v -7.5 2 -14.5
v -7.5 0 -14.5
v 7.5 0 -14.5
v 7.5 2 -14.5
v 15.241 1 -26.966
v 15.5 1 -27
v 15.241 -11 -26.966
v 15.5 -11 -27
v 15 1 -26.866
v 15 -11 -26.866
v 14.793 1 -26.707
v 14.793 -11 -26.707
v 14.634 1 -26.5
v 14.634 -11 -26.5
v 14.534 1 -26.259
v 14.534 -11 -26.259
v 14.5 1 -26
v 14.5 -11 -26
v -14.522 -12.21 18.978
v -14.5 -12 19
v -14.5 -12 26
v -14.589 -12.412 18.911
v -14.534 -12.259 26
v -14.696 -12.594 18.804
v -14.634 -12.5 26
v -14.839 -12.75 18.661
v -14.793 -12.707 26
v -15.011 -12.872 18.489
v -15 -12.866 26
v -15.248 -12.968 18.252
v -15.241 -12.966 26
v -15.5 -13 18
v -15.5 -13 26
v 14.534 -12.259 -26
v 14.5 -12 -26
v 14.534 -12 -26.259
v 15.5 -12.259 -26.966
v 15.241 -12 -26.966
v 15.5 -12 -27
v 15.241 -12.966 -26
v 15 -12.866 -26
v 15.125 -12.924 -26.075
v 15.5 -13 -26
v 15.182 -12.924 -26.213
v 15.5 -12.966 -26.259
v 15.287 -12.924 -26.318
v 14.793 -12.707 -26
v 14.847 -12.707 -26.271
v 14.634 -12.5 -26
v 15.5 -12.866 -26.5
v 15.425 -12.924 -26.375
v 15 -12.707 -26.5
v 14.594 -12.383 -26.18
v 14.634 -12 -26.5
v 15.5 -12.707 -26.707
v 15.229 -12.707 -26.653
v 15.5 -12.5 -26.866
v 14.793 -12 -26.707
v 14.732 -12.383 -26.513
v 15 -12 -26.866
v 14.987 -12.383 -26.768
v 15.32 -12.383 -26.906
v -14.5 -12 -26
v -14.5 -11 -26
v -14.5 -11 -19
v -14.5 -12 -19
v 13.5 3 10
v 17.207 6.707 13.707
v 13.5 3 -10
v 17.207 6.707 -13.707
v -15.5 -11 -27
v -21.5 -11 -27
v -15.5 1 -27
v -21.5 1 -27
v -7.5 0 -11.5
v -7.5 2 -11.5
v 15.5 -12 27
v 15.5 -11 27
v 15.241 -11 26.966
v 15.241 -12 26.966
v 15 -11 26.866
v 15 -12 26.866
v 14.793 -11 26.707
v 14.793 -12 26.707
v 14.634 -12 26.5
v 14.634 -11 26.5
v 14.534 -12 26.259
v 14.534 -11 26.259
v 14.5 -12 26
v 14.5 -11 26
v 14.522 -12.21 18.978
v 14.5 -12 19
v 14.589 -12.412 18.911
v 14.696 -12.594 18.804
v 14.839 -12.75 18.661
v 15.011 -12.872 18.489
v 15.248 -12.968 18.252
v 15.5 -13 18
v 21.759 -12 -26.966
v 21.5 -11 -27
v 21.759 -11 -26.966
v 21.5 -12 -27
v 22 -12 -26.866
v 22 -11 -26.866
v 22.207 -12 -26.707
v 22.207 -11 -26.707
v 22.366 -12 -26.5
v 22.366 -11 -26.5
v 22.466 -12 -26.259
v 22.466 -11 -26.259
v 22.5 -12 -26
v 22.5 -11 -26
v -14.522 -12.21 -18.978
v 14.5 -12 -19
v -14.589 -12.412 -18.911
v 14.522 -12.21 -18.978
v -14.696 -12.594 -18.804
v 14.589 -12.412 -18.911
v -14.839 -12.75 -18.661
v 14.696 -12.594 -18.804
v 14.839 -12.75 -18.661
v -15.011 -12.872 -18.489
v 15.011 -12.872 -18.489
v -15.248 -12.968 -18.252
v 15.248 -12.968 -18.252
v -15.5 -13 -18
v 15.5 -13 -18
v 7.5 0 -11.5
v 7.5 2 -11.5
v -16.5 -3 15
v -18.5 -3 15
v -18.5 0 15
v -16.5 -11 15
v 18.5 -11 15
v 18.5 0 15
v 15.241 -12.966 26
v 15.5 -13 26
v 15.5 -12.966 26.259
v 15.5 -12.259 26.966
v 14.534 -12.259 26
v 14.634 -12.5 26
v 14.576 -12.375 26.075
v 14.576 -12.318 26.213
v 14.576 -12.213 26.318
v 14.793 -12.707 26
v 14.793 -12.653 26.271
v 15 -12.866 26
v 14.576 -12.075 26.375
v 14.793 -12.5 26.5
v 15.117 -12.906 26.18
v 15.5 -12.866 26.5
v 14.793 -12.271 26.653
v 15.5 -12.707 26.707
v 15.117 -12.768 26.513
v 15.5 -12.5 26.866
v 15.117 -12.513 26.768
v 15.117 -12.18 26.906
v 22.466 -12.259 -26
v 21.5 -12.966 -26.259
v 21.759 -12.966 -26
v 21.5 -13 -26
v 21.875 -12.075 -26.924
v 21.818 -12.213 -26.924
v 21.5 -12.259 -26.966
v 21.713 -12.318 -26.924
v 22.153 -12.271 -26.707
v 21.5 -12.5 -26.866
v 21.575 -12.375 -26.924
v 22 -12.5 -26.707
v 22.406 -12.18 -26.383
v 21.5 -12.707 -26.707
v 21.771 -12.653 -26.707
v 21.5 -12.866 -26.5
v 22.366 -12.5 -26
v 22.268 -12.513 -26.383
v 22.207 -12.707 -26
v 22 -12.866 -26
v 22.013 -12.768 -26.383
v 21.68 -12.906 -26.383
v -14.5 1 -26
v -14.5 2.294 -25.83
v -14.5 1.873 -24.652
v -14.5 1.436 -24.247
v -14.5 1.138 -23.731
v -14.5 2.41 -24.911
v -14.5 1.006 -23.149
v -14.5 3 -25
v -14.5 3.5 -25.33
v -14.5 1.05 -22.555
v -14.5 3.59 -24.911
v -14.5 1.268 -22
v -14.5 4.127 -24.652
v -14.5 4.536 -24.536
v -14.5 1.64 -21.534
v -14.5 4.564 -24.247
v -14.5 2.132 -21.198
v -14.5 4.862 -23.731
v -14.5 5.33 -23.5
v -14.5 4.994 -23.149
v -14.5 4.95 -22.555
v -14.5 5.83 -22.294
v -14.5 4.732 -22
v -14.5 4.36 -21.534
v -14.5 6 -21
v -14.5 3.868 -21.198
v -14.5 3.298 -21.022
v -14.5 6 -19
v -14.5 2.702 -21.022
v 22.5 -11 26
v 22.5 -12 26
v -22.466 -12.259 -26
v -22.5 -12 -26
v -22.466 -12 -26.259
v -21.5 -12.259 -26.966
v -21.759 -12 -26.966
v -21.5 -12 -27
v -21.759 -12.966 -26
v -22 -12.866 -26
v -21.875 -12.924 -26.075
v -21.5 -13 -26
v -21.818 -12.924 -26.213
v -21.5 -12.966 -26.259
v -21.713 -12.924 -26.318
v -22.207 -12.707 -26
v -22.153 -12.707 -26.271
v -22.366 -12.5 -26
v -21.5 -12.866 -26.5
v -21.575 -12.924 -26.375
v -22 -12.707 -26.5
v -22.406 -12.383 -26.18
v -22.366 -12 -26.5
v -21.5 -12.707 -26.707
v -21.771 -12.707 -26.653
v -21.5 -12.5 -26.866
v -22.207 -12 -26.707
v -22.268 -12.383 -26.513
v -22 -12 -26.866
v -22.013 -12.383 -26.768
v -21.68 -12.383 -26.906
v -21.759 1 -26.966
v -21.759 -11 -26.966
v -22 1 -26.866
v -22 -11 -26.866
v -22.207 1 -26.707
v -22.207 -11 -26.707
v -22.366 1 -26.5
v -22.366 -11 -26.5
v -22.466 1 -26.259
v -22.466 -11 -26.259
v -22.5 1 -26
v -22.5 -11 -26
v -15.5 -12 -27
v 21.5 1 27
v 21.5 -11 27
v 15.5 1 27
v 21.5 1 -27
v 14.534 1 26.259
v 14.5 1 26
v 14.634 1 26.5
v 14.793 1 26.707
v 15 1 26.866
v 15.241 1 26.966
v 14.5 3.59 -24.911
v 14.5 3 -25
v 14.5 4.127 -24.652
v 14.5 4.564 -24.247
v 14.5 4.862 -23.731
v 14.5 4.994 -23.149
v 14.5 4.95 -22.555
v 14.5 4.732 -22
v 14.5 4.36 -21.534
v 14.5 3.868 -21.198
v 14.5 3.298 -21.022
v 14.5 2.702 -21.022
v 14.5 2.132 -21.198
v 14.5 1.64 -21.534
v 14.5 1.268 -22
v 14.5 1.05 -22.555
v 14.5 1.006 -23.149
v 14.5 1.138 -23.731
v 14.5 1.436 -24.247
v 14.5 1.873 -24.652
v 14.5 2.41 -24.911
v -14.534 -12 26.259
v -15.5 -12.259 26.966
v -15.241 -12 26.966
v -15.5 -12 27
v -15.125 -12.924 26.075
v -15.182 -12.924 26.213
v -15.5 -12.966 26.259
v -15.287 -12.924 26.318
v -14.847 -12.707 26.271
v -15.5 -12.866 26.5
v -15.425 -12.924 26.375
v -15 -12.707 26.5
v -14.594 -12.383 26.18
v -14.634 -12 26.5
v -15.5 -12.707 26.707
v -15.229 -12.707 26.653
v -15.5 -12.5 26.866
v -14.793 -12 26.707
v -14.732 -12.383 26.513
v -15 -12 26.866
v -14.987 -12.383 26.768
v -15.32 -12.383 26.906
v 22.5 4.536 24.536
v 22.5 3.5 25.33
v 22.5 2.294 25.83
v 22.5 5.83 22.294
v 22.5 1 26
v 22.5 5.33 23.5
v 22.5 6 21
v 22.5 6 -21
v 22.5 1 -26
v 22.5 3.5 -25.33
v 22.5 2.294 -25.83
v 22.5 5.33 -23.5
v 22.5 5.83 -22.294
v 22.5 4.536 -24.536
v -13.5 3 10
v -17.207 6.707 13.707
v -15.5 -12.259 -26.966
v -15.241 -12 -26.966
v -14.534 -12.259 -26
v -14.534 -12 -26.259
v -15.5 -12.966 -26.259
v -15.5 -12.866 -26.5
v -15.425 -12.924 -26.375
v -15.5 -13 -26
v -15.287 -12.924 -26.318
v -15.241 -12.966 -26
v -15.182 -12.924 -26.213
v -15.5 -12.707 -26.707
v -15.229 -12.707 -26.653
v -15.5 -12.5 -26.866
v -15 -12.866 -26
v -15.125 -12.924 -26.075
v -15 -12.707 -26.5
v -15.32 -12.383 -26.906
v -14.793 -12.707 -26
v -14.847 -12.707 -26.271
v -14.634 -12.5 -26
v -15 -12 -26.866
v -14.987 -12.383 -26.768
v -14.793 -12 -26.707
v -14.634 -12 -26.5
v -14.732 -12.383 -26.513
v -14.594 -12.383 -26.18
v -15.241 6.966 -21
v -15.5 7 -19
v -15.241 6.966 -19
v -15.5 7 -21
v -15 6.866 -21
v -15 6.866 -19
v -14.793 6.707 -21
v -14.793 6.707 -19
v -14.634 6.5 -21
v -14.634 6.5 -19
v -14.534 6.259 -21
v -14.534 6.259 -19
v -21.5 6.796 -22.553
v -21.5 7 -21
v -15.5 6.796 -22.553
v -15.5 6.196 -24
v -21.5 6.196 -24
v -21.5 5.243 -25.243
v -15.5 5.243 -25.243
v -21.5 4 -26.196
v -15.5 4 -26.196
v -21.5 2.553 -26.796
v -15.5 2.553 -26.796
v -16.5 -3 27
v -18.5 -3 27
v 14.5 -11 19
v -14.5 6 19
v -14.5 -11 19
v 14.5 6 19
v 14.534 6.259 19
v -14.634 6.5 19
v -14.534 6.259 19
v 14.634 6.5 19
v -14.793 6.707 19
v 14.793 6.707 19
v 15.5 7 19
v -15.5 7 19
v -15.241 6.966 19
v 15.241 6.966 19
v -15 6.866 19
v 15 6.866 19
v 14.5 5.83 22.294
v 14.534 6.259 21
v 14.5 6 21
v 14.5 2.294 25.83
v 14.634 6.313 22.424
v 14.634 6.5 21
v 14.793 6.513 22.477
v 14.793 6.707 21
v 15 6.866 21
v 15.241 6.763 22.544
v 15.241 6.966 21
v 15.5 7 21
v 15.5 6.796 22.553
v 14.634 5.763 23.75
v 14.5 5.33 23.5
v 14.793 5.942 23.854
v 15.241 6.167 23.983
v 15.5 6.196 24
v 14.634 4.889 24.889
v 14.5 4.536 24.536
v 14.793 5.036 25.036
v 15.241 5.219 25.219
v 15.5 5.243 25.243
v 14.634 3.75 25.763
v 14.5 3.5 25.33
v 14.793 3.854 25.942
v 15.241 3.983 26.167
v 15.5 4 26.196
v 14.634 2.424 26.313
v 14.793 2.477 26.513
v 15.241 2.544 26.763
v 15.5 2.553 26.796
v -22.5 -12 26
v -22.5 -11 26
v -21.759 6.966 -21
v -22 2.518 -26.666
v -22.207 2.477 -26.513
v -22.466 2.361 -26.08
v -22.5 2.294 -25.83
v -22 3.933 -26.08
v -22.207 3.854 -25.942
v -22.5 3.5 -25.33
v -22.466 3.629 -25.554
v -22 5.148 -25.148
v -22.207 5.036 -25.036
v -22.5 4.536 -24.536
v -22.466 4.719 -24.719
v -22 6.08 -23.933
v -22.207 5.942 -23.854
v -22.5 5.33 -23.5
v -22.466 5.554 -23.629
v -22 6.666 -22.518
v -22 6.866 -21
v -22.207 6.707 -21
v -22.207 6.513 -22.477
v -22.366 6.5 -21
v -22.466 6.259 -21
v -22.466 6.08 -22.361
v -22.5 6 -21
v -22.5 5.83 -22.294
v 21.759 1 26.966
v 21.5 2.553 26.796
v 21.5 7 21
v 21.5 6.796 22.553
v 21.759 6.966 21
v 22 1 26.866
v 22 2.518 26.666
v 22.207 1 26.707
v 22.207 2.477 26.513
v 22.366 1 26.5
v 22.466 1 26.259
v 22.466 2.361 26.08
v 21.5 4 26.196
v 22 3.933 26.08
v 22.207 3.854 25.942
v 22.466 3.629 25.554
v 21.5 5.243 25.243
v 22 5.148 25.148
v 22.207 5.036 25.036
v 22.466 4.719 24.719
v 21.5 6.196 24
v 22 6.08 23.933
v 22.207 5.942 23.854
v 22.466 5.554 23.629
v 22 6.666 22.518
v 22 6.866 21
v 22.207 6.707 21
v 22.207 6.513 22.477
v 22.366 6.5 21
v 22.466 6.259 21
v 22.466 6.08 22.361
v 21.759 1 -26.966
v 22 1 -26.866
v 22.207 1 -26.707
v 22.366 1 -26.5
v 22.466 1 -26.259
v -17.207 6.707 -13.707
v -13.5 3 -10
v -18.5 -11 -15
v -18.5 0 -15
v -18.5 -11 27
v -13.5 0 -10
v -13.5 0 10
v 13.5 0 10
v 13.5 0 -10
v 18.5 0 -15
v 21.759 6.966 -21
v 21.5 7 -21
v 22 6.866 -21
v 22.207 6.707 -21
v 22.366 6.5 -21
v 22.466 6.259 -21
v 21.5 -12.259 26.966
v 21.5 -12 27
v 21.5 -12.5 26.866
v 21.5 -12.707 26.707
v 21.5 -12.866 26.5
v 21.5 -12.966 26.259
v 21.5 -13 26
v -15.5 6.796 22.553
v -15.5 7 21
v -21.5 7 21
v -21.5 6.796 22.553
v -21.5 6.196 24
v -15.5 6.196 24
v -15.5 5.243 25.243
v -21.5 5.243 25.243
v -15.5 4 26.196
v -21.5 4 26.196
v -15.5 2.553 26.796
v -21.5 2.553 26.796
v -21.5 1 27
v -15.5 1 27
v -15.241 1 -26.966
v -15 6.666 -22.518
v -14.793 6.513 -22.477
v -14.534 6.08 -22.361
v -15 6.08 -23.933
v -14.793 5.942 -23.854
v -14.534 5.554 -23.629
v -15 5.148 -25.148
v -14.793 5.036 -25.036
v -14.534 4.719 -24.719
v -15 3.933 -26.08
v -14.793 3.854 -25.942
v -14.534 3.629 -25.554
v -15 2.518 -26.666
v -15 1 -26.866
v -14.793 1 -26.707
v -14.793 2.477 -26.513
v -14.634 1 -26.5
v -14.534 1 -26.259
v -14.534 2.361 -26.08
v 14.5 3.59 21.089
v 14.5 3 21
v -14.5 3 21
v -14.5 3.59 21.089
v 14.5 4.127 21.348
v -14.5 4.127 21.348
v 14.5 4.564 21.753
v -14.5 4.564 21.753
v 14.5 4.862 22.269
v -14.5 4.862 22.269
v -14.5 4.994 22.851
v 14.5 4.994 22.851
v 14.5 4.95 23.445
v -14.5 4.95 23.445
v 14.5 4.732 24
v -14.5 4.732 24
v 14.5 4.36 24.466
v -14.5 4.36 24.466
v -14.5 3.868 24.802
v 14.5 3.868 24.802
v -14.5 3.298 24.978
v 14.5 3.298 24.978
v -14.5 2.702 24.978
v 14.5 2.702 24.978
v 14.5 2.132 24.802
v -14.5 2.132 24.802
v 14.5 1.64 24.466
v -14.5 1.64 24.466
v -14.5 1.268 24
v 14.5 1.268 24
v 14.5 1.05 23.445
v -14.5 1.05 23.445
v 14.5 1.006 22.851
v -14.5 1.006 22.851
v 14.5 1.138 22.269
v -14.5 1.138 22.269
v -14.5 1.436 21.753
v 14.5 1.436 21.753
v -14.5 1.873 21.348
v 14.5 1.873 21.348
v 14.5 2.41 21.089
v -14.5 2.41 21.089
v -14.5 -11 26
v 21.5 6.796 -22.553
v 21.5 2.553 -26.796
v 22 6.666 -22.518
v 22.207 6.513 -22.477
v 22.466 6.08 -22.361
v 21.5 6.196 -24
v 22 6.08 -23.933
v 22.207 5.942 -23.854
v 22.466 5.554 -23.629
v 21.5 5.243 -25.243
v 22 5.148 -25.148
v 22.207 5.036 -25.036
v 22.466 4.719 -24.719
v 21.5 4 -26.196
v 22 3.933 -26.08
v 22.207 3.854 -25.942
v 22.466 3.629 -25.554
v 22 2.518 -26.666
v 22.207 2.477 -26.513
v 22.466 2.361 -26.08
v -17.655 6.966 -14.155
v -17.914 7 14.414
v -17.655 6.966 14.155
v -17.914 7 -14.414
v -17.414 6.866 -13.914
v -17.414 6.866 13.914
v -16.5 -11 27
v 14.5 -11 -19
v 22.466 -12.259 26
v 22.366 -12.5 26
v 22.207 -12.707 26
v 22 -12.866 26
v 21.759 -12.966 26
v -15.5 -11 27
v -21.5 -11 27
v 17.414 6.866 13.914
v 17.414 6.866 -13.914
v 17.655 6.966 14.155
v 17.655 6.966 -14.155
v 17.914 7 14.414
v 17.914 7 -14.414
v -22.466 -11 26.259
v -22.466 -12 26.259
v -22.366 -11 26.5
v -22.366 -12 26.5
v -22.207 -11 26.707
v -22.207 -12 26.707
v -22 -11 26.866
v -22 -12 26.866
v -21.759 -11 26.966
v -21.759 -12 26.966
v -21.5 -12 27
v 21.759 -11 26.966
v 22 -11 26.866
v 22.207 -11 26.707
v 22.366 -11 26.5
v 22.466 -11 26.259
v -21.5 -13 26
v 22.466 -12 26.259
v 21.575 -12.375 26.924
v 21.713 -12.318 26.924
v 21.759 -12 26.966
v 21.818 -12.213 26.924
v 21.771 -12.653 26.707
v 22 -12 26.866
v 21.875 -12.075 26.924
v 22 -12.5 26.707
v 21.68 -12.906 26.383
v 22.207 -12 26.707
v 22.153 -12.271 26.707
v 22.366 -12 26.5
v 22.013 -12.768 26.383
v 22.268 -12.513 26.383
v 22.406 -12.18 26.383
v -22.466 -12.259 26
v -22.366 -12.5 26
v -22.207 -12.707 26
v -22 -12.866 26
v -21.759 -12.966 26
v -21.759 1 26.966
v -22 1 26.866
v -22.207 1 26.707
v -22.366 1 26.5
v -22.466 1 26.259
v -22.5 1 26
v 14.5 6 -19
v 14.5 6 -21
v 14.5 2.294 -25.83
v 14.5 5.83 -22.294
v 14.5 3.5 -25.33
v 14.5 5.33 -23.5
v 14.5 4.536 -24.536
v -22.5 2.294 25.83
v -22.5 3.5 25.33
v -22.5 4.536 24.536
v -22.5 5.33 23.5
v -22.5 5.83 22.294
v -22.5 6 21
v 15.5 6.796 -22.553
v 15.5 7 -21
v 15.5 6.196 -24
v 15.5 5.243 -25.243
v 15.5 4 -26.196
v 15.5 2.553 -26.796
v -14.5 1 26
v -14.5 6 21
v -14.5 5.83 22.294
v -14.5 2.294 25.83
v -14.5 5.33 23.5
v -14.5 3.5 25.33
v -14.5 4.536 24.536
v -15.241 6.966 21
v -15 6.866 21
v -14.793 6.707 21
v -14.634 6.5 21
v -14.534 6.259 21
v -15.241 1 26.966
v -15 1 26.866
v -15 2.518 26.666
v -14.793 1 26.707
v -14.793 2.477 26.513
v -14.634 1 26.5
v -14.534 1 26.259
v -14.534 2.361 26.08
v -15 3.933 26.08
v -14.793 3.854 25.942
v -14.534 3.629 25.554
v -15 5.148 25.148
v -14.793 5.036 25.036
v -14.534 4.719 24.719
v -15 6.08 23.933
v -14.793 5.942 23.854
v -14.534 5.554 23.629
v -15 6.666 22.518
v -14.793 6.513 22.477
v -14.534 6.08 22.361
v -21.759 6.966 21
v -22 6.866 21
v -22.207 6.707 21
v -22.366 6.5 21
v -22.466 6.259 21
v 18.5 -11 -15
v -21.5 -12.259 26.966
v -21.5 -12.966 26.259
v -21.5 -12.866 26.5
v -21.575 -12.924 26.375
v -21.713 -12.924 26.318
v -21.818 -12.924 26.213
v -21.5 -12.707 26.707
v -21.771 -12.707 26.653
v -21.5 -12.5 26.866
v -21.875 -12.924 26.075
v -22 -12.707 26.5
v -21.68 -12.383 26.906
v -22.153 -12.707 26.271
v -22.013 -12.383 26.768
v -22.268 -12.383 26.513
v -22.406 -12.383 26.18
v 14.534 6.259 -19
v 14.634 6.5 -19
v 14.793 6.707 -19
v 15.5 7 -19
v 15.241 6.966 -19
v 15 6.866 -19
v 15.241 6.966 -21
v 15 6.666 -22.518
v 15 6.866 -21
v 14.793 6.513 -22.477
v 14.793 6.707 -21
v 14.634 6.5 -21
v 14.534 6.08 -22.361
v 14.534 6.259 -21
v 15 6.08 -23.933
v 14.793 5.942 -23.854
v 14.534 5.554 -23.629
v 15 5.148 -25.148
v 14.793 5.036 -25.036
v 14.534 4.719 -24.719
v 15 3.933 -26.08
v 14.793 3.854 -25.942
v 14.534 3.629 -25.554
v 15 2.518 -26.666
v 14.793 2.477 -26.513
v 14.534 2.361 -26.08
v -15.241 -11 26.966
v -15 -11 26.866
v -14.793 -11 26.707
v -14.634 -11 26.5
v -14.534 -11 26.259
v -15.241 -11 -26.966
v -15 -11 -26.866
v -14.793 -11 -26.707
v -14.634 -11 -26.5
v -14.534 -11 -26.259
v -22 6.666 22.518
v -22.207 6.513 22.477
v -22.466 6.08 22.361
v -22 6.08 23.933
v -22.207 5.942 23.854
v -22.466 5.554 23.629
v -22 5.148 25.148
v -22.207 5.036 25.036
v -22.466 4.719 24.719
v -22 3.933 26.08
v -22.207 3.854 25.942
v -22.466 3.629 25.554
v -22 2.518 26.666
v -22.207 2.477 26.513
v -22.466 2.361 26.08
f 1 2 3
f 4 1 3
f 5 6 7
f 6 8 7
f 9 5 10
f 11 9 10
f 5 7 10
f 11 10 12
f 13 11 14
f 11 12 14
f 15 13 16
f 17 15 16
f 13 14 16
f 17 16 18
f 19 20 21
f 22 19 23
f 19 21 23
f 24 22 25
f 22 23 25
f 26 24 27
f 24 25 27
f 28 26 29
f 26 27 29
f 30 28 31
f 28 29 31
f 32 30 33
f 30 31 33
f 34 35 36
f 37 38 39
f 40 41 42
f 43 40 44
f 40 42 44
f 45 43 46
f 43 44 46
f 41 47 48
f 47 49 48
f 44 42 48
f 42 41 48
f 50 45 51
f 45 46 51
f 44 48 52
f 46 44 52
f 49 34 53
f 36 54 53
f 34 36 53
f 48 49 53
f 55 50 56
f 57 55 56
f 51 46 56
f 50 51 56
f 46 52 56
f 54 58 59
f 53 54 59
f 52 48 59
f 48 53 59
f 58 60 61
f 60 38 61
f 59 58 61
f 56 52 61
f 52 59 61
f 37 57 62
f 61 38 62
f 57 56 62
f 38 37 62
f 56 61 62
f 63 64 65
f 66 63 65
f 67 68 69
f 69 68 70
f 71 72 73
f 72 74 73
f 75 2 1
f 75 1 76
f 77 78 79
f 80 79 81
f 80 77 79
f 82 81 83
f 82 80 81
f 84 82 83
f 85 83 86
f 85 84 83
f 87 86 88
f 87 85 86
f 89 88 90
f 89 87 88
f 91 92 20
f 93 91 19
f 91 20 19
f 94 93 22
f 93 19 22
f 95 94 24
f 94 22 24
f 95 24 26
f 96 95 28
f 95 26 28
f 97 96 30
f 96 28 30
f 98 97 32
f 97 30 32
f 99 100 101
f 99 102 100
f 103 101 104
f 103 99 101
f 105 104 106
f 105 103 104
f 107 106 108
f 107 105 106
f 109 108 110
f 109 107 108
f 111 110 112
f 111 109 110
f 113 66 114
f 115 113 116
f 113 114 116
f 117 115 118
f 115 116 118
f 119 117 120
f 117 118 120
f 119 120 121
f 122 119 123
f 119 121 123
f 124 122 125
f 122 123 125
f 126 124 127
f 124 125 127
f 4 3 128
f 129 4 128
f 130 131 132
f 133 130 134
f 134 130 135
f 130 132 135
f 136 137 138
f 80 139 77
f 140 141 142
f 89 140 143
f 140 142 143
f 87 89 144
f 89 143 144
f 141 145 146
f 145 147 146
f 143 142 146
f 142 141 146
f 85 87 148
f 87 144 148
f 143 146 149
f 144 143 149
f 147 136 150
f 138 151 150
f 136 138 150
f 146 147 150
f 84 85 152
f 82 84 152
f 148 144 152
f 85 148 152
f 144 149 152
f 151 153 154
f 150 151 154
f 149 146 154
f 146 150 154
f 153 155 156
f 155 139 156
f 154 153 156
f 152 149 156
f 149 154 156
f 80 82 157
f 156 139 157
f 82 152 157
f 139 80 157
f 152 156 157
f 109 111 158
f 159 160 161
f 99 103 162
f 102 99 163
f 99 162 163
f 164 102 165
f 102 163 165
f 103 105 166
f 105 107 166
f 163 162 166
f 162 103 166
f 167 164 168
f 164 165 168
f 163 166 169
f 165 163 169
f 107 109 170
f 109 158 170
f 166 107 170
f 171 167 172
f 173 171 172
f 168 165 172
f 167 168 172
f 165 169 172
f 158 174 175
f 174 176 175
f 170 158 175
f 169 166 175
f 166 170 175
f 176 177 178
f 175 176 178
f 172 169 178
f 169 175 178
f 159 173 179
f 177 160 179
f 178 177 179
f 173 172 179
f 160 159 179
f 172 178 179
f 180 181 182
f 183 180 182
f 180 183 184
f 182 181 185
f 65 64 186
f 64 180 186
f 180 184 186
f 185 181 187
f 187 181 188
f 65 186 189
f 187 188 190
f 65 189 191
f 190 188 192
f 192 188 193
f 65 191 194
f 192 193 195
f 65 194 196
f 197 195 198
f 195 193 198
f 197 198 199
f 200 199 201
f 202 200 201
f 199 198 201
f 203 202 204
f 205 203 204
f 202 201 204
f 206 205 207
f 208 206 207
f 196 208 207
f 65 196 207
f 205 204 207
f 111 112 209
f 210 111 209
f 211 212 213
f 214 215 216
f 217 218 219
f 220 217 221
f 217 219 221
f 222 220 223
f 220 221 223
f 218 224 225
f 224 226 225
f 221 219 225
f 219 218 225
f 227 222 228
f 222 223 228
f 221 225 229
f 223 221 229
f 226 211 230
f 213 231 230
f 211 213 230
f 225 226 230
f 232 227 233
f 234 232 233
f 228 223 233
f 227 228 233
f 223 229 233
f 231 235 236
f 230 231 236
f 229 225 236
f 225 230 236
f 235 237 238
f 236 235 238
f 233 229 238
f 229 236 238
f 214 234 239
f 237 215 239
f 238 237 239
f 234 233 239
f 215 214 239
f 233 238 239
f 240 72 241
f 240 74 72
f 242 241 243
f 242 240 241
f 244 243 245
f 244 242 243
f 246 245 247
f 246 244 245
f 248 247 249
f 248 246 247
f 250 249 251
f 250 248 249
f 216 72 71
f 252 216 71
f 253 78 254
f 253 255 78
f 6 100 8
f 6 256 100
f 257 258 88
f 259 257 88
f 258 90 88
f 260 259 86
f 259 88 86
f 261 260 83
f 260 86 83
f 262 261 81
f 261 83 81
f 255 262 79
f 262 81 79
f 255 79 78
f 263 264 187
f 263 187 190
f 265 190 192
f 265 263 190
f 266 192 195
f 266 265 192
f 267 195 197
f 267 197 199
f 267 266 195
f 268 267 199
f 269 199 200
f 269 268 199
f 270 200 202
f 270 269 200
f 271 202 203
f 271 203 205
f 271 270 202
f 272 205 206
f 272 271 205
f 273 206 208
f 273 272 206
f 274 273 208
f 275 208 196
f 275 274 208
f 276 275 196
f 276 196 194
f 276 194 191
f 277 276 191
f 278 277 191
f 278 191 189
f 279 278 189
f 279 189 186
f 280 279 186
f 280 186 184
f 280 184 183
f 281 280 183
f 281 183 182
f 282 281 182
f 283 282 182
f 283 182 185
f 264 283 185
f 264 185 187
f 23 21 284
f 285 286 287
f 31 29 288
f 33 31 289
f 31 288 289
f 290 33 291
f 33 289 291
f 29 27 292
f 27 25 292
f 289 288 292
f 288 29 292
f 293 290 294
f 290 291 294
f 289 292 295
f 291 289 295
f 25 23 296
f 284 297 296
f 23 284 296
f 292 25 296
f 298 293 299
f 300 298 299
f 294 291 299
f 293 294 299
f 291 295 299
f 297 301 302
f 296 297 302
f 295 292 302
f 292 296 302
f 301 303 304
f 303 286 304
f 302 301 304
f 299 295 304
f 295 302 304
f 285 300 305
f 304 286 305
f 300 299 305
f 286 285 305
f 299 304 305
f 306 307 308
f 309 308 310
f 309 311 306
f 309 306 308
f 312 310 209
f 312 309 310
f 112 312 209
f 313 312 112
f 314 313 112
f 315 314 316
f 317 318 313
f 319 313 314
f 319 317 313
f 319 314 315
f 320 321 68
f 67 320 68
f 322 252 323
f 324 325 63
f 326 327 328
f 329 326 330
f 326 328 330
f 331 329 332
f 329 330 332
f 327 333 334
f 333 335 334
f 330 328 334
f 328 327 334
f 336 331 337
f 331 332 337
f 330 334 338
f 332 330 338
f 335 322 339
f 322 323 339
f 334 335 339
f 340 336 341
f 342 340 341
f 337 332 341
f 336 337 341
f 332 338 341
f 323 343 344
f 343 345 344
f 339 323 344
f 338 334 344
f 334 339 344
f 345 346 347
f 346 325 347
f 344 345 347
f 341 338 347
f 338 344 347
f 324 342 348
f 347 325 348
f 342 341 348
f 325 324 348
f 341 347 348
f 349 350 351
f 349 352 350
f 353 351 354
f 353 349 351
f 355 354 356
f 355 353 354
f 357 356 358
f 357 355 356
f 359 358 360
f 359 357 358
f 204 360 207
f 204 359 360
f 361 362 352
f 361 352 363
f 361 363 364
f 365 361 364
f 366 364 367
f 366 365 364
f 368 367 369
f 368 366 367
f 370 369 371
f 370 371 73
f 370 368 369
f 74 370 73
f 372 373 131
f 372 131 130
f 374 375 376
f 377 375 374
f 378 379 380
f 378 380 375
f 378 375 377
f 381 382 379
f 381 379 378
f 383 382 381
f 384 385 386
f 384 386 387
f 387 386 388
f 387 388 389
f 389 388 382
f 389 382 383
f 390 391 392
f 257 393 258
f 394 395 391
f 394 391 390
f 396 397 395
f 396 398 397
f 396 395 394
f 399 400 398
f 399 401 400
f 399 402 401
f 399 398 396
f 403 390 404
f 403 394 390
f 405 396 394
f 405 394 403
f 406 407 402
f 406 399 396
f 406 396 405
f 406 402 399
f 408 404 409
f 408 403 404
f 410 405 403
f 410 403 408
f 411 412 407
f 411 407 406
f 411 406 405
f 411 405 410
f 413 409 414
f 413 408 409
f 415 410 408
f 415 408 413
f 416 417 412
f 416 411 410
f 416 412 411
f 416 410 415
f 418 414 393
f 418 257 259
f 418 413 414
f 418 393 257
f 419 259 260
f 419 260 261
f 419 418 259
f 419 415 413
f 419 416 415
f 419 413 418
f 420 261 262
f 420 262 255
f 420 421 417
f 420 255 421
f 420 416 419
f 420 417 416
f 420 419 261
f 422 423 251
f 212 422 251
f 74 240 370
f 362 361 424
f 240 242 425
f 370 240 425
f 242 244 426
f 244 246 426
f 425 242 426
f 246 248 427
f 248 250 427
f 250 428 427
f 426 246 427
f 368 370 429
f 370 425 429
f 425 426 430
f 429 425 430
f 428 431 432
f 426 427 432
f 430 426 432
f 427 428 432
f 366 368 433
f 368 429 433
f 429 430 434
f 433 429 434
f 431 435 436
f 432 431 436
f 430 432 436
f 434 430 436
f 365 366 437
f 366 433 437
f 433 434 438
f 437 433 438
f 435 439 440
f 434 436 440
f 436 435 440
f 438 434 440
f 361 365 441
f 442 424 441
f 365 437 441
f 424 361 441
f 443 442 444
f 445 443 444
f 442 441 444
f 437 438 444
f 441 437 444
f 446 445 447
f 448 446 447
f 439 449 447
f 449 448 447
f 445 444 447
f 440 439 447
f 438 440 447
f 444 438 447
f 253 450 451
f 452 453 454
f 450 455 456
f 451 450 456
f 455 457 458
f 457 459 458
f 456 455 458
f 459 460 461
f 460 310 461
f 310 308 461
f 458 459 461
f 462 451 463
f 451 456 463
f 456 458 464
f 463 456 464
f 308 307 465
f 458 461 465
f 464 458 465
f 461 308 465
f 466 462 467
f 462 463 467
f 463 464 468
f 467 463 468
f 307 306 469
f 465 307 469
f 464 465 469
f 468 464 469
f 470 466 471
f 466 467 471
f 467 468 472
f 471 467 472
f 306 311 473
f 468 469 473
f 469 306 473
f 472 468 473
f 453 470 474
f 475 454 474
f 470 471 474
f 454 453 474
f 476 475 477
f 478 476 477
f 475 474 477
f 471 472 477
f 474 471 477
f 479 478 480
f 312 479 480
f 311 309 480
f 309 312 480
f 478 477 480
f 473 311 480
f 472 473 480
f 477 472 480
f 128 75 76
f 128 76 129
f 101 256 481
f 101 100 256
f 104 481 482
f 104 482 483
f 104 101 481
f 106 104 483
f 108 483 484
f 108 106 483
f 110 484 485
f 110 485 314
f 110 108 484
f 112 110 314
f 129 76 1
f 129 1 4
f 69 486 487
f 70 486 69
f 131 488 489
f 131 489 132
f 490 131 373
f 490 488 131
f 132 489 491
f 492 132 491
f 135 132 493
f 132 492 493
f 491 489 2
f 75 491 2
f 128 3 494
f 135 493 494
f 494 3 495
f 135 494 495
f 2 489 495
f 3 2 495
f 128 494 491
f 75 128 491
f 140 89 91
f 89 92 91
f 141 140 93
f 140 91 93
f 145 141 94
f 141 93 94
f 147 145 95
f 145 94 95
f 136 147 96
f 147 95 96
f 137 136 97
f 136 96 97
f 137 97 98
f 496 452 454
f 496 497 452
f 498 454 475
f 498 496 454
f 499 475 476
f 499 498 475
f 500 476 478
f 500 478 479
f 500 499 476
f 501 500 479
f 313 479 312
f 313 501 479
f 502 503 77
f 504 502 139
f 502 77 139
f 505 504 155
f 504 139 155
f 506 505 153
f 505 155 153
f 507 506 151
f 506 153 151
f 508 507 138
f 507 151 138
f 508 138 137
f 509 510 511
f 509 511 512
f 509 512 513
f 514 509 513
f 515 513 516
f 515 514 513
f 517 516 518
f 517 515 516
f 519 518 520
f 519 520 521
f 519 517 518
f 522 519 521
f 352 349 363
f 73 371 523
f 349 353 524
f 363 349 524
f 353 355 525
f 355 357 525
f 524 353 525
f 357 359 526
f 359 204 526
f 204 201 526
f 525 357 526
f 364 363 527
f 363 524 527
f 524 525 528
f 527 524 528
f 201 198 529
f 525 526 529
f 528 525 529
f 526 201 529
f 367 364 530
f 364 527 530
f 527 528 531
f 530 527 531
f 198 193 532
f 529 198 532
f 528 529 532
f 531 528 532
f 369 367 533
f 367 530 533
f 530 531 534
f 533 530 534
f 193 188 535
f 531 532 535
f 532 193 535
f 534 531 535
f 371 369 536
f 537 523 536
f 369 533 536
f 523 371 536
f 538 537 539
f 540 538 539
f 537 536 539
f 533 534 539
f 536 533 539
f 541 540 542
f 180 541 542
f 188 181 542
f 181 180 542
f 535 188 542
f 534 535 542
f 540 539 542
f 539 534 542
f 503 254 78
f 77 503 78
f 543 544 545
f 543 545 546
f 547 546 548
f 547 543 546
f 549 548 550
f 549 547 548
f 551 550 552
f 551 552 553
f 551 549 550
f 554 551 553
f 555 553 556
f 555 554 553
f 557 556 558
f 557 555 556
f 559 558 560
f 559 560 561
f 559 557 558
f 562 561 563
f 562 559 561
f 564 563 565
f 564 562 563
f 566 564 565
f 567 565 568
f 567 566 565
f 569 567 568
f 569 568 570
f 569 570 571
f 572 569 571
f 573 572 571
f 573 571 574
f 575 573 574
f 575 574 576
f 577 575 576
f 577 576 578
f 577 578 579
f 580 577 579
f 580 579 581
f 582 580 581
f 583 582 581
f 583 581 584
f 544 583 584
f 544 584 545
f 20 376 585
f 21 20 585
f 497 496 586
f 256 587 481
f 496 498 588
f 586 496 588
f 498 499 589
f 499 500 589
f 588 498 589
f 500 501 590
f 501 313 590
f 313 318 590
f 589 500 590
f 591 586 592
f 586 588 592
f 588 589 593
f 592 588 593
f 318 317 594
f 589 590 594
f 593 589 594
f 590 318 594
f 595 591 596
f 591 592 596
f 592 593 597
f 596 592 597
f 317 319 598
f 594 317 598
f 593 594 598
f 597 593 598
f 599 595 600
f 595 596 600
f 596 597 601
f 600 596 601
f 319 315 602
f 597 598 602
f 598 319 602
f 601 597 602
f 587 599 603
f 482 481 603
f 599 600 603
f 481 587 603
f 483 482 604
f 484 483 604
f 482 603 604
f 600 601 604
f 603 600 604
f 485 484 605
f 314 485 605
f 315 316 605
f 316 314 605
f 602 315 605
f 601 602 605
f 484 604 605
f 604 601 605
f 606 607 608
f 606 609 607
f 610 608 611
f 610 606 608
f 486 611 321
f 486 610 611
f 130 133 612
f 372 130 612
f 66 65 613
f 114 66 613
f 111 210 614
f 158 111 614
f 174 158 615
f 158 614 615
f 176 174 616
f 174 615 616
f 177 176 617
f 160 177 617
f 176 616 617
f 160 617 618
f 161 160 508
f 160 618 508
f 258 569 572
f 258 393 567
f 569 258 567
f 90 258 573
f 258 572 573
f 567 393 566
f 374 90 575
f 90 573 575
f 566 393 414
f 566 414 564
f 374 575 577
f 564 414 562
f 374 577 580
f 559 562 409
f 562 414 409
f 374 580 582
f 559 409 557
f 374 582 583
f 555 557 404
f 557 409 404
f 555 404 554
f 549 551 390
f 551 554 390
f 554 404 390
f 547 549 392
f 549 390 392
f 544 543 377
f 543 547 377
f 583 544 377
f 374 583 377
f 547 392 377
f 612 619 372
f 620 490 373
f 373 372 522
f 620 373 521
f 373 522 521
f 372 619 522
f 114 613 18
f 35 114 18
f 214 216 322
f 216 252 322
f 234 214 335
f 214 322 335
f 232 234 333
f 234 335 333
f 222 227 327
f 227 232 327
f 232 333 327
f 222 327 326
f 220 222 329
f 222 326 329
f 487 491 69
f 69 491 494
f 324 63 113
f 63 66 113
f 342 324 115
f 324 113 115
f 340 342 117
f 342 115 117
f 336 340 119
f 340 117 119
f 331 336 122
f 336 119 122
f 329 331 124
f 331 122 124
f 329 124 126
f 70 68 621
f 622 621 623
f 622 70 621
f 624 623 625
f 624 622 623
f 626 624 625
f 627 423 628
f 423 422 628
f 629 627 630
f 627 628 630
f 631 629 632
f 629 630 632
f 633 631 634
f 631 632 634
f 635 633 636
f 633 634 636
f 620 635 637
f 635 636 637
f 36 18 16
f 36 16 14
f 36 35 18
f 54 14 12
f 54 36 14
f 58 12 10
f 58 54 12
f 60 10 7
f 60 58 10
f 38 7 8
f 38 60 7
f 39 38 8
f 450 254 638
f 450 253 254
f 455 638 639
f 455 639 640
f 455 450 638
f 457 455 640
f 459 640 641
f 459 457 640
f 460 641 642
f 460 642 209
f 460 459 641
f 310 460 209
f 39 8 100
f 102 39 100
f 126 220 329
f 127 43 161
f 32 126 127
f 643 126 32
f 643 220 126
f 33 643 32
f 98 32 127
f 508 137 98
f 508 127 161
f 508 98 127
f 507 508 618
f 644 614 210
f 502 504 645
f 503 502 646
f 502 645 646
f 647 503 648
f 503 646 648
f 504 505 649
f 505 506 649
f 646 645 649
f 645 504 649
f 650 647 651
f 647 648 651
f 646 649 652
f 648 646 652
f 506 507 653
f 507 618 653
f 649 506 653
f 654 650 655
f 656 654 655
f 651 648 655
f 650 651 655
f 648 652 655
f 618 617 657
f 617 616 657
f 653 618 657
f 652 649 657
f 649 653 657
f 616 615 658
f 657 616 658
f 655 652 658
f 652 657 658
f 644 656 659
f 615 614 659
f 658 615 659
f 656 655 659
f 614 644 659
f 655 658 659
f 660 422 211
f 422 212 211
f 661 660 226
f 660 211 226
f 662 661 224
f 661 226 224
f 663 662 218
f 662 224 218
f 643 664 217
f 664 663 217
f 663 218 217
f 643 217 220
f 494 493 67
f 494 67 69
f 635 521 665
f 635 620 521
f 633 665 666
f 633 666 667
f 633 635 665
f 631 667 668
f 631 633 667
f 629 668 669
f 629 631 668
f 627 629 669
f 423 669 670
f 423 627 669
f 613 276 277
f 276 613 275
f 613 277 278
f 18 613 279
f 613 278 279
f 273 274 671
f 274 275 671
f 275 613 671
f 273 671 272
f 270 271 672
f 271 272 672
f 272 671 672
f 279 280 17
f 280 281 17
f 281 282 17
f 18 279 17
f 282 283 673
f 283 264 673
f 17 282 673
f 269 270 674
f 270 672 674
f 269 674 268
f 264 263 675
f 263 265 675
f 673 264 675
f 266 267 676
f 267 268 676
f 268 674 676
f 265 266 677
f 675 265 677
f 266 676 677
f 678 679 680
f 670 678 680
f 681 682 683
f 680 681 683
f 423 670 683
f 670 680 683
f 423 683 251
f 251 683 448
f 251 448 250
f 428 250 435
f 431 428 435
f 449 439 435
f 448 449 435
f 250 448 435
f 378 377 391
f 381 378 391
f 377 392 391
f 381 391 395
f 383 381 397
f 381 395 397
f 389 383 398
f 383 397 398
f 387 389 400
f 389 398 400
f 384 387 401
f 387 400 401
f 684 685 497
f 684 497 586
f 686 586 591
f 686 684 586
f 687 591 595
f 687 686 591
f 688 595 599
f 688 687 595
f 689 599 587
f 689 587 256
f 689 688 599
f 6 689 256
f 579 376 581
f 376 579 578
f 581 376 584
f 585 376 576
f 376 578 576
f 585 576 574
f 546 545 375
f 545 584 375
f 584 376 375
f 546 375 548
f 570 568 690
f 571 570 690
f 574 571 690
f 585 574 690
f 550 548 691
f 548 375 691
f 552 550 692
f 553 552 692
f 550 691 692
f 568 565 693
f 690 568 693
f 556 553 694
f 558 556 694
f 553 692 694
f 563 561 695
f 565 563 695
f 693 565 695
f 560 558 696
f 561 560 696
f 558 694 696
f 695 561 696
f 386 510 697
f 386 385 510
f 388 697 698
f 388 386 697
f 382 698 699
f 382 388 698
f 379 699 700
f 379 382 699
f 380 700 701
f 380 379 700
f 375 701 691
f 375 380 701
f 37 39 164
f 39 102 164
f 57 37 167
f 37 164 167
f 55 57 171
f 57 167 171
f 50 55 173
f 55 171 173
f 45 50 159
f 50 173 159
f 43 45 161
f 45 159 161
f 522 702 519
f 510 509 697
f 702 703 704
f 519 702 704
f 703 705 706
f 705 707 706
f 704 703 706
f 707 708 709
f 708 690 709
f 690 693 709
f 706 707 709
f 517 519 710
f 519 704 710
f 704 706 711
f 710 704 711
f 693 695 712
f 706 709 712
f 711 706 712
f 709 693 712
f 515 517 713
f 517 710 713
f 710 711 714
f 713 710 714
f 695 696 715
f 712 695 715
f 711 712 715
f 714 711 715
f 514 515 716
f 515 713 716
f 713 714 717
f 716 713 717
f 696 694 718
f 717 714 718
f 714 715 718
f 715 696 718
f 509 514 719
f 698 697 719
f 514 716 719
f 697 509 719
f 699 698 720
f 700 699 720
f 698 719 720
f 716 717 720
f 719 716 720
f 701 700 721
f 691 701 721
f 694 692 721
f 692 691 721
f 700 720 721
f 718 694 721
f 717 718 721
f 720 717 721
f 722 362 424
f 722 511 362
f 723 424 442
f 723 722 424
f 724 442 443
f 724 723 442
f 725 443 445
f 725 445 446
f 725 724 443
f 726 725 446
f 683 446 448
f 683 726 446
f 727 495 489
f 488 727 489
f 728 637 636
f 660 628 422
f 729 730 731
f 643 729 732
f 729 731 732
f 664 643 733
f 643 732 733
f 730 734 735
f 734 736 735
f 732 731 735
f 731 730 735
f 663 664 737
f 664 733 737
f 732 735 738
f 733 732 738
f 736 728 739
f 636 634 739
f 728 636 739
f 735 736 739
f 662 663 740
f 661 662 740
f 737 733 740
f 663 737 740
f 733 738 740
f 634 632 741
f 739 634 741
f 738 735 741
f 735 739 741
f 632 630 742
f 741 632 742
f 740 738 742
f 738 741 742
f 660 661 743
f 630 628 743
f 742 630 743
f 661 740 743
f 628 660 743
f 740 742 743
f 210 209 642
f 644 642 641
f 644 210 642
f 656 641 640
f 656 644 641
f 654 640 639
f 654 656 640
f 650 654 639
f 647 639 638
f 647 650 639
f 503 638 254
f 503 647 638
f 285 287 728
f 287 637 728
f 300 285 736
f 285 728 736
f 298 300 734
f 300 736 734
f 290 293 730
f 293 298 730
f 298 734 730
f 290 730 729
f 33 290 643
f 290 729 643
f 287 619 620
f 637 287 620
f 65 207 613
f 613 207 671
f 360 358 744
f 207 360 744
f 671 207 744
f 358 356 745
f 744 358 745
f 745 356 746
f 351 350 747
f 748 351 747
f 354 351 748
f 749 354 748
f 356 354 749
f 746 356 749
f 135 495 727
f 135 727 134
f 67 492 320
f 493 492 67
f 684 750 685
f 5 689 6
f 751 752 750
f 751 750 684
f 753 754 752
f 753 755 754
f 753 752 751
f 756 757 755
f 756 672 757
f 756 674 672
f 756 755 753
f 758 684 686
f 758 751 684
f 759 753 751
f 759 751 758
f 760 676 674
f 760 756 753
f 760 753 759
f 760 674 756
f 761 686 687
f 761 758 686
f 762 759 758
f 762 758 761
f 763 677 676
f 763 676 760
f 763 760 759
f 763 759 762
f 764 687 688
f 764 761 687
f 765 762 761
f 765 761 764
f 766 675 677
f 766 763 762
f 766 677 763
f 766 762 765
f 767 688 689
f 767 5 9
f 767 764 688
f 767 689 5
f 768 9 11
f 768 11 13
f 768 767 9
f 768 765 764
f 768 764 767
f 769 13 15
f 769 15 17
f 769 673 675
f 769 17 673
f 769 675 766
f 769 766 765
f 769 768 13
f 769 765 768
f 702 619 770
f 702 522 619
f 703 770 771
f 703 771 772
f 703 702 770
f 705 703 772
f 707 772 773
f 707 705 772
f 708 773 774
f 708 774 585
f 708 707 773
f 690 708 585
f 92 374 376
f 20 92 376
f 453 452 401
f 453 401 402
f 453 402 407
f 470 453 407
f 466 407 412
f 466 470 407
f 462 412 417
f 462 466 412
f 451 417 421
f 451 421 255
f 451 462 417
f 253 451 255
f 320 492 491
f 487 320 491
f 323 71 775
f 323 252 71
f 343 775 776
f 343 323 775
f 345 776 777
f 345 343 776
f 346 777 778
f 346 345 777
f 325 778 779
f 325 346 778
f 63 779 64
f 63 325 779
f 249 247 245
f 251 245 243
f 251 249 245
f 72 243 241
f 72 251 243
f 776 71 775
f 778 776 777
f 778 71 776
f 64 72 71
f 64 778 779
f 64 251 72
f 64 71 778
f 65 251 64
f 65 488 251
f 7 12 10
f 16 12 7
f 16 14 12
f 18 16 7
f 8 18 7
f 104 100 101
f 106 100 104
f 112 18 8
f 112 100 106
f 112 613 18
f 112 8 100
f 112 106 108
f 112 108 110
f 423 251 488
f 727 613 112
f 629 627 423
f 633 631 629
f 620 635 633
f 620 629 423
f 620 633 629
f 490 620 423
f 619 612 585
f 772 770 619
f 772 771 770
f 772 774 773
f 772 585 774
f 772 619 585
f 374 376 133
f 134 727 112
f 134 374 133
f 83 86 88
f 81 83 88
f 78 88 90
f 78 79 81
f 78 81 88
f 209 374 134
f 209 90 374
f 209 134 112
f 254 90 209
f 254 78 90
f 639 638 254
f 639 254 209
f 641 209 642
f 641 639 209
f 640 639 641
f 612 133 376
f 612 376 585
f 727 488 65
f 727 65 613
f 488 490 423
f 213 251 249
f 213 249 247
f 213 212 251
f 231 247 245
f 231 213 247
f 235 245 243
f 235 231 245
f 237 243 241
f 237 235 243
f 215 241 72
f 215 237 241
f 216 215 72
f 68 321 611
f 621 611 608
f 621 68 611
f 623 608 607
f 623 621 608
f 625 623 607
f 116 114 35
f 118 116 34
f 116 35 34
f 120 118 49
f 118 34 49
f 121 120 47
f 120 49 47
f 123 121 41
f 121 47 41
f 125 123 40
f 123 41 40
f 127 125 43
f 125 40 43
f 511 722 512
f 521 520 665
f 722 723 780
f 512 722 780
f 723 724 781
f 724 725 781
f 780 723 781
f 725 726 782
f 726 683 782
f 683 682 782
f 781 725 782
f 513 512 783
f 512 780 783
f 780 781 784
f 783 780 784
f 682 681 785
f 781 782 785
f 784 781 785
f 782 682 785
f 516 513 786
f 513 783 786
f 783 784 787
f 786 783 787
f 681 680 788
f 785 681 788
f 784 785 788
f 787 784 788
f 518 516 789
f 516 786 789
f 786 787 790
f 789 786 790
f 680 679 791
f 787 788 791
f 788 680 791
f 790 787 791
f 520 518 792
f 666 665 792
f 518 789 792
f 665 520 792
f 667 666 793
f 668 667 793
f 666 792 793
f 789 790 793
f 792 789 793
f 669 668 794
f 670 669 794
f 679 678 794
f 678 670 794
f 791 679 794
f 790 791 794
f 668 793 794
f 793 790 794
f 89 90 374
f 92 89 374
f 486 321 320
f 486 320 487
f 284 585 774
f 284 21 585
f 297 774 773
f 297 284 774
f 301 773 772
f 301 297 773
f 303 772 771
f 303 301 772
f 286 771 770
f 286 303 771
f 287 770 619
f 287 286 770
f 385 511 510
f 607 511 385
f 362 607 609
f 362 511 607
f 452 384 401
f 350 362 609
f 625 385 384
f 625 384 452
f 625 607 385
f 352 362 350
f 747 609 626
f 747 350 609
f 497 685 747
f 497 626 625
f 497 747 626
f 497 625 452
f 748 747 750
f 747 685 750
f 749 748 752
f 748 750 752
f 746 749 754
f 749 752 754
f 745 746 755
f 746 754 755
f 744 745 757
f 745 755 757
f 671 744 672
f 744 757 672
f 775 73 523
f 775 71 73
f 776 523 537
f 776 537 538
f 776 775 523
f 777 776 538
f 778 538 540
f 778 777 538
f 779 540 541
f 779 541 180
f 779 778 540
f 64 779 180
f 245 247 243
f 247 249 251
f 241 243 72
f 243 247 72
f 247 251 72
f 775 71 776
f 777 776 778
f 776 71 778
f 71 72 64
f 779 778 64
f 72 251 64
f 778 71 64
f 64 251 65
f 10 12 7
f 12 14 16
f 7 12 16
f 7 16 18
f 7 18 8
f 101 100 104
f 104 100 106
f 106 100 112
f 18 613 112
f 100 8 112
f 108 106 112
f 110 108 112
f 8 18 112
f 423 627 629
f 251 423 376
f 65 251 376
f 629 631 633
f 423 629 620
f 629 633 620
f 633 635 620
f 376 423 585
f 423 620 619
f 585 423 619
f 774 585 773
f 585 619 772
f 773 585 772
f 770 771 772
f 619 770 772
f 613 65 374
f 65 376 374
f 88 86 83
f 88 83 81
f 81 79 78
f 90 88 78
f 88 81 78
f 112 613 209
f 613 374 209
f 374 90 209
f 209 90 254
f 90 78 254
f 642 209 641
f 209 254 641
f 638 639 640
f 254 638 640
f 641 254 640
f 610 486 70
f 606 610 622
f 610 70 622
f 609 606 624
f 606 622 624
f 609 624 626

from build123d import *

# Parameters (mm, degrees)
SKETCH1_W           = 27
SKETCH1_H           = 20
OLED_FACE_DEPTH     = 7
OLED_INDENT_SIZE    = 4
SKETCH4_W           = 15
SKETCH4_H           = 3
CUT_EXTRUDE1_DEPTH  = 2
FILLET3_R           = 6
BOSS_EXTRUDE4_REACH = 47
SKETCH5_R           = 2
SKETCH6_W           = 29
SKETCH6_H           = 4
BOSS_EXTRUDE7_DEPTH = 11
OLED_BOTTOM_DEPTH   = 2
SKETCH9_W           = 2
SKETCH9_H           = 12
CUT_EXTRUDE2_DEPTH  = 8
FILLET4_R           = 1
FILLET5_R           = 1
FILLET6_R           = 1


with BuildPart() as part:
    # Sketch1 → OLED_Face (new body)
    with BuildSketch(Plane(origin=(0, 0, 0), x_dir=(1, 0, 0), z_dir=(0, 1, 0))):
        Polygon((14.5, 19), (-14.5, 19), (-14.5, 27), (-22.5, 27), (-22.5, -27), (-14.5, -27), (-14.5, -19), (14.5, -19), (14.5, -27), (22.5, -27), (22.5, 27), (14.5, 27), align=None)
        Rectangle(SKETCH1_W, SKETCH1_H, mode=Mode.SUBTRACT)
    extrude(amount=OLED_FACE_DEPTH)

    # OLED_Indent
    oled_indent_edges = [part.edges().sort_by_distance(p)[0] for p in [
        (0, 7, -10),
        (13.5, 7, 0),
        (0, 7, 10),
        (-13.5, 7, 0),
    ]]
    chamfer(oled_indent_edges, length=OLED_INDENT_SIZE)

    # Sketch4 → Cut-Extrude1 (cut)
    with BuildSketch(Plane.XZ):
        with Locations((0, -13)):
            Rectangle(SKETCH4_W, SKETCH4_H)
    extrude(amount=-CUT_EXTRUDE1_DEPTH, mode=Mode.SUBTRACT)

    # Fillet3
    fillet3_edges = [part.edges().sort_by_distance(p)[0] for p in [
        (-18.5, 7, -27),
        (18.5, 7, -27),
        (-18.5, 7, 27),
        (18.5, 7, 27),
    ]]
    fillet(fillet3_edges, radius=FILLET3_R)

    # Sketch5 → Boss-Extrude4 (add, up to next)
    with BuildSketch(Plane(origin=(22.5, 0, 0), x_dir=(0, 0, -1), z_dir=(1, 0, 0)), mode=Mode.PRIVATE) as boss_extrude4_sk1:
        with Locations((-23, 3)):
            Circle(SKETCH5_R)
    boss_extrude4_tool1 = extrude(boss_extrude4_sk1.sketch, amount=-BOSS_EXTRUDE4_REACH, mode=Mode.PRIVATE) - part.part
    add(boss_extrude4_tool1.solids().sort_by_distance((22.5, 3, 23))[0])
    # Sketch5 → Boss-Extrude4 (add, up to next)
    with BuildSketch(Plane(origin=(22.5, 0, 0), x_dir=(0, 0, -1), z_dir=(1, 0, 0)), mode=Mode.PRIVATE) as boss_extrude4_sk2:
        with Locations((23, 3)):
            Circle(SKETCH5_R)
    boss_extrude4_tool2 = extrude(boss_extrude4_sk2.sketch, amount=-BOSS_EXTRUDE4_REACH, mode=Mode.PRIVATE) - part.part
    add(boss_extrude4_tool2.solids().sort_by_distance((22.5, 3, -23))[0])

    # Sketch6 → Boss-Extrude7 (add)
    with BuildSketch(Plane.XZ):
        Polygon((-14.5, 19), (-14.5, 27), (-22.5, 27), (-22.5, -27), (-14.5, -27), (-14.5, -19), (-14.5, -15), (-18.5, -15), (-18.5, 15), (-14.5, 15), align=None)
        Polygon((14.5, -15), (18.5, -15), (18.5, 15), (14.5, 15), (14.5, 19), (14.5, 27), (22.5, 27), (22.5, -27), (14.5, -27), (14.5, -19), align=None)
        with Locations((0, 17)):
            Rectangle(SKETCH6_W, SKETCH6_H)
        with Locations((0, -17)):
            Rectangle(SKETCH6_W, SKETCH6_H)
    extrude(amount=BOSS_EXTRUDE7_DEPTH)

    # Sketch9 → Cut-Extrude2 (cut)
    with BuildSketch(Plane.XZ.offset(11)):
        with Locations((-17.5, 21)):
            Rectangle(SKETCH9_W, SKETCH9_H)
    extrude(amount=-CUT_EXTRUDE2_DEPTH, mode=Mode.SUBTRACT)

    # Fillet5
    fillet5_edges = [part.edges().sort_by_distance(p)[0] for p in [
        (22.5, 7, 0),
        (-22.5, 7, 0),
        (14.5, -5, -27),
        (14.5, 5.242640687, -25.242640687),
        (22.5, -5, -27),
        (22.5, -5, 27),
        (22.5, 5.242640687, 25.242640687),
        (22.5, 5.242640687, -25.242640687),
        (-22.5, -5, -27),
        (-14.5, -5, -27),
        (-14.5, 5.242640687, -25.242640687),
        (-22.5, -5, 27),
        (-22.5, 5.242640687, 25.242640687),
        (-22.5, 5.242640687, -25.242640687),
        (14.5, -5, 27),
        (14.5, 5.242640687, 25.242640687),
        (-14.5, -5, 27),
        (-14.5, 5.242640687, 25.242640687),
        (-14.5, 7, -20),
        (14.5, 7, -20),
        (-14.5, 7, 20),
        (14.5, 7, 20),
    ]]
    fillet(fillet5_edges, radius=FILLET5_R)

    # Fillet6
    fillet6_edges = [part.edges().sort_by_distance(p)[0] for p in [
        (0, 7, -14),
        (-17.5, 7, 0),
        (17.5, 7, 0),
        (0, 7, 14),
    ]]
    fillet(fillet6_edges, radius=FILLET6_R)


with BuildPart() as body_2:
    # Sketch8 → OLED_Bottom (new body)
    with BuildSketch(Plane.XZ.offset(11)):
        Polygon((-22.5, 27), (-22.5, -27), (-14.5, -27), (-14.5, -19), (14.5, -19), (14.5, -27), (22.5, -27), (22.5, 27), (14.5, 27), (14.5, 19), (-14.5, 19), (-14.5, 27), align=None)
    extrude(amount=OLED_BOTTOM_DEPTH)

    # Fillet4
    fillet4_edges = [body_2.edges().sort_by_distance(p)[0] for p in [
        (22.5, -13, 0),
        (18.5, -13, 27),
        (-14.5, -12, -27),
        (14.5, -13, 23),
        (-22.5, -12, -27),
        (-22.5, -12, 27),
        (-14.5, -12, 27),
        (14.5, -12, 27),
        (22.5, -12, 27),
        (22.5, -12, -27),
        (14.5, -12, -27),
        (0, -13, 19),
        (-14.5, -13, 23),
        (-18.5, -13, 27),
        (-22.5, -13, 0),
        (-18.5, -13, -27),
        (-14.5, -13, -23),
        (0, -13, -19),
        (14.5, -13, -23),
        (18.5, -13, -27),
    ]]
    fillet(fillet4_edges, radius=FILLET4_R)


solid = Compound([part.part, body_2.part])
